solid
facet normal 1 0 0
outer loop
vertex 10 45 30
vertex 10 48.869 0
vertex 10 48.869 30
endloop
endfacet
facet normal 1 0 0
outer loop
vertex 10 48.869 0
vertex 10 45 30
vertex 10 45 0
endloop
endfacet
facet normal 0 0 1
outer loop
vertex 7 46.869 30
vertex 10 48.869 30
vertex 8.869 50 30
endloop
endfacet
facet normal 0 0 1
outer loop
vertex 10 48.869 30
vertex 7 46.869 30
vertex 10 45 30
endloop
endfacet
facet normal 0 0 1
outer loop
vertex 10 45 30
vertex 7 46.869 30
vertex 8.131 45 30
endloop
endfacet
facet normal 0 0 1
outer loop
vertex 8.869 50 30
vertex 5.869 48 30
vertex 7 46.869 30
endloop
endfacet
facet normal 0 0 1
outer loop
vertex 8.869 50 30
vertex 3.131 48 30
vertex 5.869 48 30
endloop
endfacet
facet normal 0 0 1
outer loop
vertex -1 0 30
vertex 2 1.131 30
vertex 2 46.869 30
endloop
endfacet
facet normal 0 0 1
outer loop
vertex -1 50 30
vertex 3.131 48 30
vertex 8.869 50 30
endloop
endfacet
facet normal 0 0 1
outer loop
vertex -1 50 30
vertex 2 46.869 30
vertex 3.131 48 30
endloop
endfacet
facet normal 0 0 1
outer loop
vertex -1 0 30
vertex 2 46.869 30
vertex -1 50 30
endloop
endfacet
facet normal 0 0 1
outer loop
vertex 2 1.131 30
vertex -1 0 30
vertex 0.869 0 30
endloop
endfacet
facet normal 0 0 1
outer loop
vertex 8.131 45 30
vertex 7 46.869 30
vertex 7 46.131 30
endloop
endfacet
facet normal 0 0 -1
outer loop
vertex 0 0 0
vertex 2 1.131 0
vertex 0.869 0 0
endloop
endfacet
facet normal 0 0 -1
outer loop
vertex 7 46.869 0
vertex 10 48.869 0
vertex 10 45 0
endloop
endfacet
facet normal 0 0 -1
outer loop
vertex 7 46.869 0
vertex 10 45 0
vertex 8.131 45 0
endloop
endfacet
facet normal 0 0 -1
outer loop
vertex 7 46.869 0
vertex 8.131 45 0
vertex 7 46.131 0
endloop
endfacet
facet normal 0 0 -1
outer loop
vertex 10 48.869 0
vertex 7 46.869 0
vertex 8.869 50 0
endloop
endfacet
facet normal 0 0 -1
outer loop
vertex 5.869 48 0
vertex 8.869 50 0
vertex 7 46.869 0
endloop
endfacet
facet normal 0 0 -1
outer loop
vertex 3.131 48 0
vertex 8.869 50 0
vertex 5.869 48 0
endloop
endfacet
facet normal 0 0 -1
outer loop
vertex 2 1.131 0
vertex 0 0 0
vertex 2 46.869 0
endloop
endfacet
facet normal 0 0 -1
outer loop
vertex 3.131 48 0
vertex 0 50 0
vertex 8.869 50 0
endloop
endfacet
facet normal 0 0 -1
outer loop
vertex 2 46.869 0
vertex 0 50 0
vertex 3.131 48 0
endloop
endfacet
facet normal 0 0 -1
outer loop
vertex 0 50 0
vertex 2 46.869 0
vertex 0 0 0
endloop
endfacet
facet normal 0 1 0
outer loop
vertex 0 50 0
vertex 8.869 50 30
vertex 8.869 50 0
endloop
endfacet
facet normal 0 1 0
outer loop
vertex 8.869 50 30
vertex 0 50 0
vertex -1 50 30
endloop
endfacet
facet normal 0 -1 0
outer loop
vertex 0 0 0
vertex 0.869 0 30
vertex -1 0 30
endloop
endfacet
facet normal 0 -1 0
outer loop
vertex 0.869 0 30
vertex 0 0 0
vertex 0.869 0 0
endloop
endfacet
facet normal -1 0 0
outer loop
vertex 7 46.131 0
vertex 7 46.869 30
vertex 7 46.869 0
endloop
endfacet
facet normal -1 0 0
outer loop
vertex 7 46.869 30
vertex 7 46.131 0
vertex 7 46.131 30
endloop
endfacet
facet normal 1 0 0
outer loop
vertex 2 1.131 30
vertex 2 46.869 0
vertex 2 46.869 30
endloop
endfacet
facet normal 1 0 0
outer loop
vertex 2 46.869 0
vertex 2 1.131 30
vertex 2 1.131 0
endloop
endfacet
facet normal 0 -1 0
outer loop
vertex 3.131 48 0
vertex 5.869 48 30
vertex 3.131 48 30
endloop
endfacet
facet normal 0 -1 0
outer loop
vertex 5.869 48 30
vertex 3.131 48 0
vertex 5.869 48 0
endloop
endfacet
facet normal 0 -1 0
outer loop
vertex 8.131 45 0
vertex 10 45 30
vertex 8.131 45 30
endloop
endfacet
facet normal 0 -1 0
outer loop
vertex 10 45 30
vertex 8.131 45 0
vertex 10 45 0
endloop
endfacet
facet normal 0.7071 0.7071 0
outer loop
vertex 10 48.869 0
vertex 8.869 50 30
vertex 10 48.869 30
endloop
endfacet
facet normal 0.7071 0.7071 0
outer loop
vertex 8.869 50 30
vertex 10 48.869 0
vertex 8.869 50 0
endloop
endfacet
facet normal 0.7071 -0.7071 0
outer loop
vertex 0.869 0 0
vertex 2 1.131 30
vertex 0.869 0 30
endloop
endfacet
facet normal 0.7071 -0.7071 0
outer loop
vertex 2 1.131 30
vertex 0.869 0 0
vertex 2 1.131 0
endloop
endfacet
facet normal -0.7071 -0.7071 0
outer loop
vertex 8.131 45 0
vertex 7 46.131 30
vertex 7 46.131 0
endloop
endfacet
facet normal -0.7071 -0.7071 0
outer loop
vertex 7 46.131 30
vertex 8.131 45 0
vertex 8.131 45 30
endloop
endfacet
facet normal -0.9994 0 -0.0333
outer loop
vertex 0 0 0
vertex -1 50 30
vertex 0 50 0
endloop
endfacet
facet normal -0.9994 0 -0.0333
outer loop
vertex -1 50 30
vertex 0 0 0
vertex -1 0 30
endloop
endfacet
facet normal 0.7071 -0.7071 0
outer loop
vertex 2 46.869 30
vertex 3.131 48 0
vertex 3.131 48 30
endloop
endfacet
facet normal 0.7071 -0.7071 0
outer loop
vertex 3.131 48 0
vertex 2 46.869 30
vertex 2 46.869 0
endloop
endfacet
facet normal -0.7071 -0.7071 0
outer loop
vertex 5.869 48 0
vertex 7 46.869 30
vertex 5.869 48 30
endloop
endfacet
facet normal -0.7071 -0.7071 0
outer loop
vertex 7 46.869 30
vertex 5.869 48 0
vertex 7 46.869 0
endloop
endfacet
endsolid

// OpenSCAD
gap=5;
hook_y=3;
hook_thickness=3;
plate_thickness=2;
top_thickness=2;
draft=1;
bevel_length=1.6;
bevel_shift=(sqrt(2)*bevel_length)/2;

x=plate_thickness+gap+hook_thickness;
y=50;
z=30;

union() {
     difference() {
	  cube([x,y,z]);
	  translate([plate_thickness,-top_thickness,0])
	       cube([gap,y,z]);
	  translate([plate_thickness,0,0])
	       cube([x-plate_thickness,y-top_thickness-hook_y, z]);

	  linear_extrude(height=z)
	       translate([x,y-bevel_shift,0])
	       rotate([0,0,45])
	       square(bevel_length);

	  linear_extrude(height=z)
	       translate([plate_thickness,-bevel_shift,0])
	       rotate([0,0,45])
	       square(bevel_length);

	  #linear_extrude(height=z)
	       translate([plate_thickness+gap,y-hook_y-top_thickness-bevel_shift,0])
	       rotate([0,0,45])
	       square(bevel_length);
      }

     translate([0,0,z])
	  rotate([270,0,0])
	  linear_extrude(height=50)
	  polygon([[-1*draft,0], [0,0],[0,z]]);

     linear_extrude(height=50)
	  translate([x-plate_thickness,0,z])
	  cube(1);

     linear_extrude(height=z)
	  #translate([plate_thickness,y-top_thickness-bevel_shift,0])
	  rotate([0,0,45])
	  square(bevel_length);

     linear_extrude(height=z)
	  translate([plate_thickness+gap,y-top_thickness-bevel_shift,0])
	  rotate([0,0,45])
	  square(bevel_length);
}
